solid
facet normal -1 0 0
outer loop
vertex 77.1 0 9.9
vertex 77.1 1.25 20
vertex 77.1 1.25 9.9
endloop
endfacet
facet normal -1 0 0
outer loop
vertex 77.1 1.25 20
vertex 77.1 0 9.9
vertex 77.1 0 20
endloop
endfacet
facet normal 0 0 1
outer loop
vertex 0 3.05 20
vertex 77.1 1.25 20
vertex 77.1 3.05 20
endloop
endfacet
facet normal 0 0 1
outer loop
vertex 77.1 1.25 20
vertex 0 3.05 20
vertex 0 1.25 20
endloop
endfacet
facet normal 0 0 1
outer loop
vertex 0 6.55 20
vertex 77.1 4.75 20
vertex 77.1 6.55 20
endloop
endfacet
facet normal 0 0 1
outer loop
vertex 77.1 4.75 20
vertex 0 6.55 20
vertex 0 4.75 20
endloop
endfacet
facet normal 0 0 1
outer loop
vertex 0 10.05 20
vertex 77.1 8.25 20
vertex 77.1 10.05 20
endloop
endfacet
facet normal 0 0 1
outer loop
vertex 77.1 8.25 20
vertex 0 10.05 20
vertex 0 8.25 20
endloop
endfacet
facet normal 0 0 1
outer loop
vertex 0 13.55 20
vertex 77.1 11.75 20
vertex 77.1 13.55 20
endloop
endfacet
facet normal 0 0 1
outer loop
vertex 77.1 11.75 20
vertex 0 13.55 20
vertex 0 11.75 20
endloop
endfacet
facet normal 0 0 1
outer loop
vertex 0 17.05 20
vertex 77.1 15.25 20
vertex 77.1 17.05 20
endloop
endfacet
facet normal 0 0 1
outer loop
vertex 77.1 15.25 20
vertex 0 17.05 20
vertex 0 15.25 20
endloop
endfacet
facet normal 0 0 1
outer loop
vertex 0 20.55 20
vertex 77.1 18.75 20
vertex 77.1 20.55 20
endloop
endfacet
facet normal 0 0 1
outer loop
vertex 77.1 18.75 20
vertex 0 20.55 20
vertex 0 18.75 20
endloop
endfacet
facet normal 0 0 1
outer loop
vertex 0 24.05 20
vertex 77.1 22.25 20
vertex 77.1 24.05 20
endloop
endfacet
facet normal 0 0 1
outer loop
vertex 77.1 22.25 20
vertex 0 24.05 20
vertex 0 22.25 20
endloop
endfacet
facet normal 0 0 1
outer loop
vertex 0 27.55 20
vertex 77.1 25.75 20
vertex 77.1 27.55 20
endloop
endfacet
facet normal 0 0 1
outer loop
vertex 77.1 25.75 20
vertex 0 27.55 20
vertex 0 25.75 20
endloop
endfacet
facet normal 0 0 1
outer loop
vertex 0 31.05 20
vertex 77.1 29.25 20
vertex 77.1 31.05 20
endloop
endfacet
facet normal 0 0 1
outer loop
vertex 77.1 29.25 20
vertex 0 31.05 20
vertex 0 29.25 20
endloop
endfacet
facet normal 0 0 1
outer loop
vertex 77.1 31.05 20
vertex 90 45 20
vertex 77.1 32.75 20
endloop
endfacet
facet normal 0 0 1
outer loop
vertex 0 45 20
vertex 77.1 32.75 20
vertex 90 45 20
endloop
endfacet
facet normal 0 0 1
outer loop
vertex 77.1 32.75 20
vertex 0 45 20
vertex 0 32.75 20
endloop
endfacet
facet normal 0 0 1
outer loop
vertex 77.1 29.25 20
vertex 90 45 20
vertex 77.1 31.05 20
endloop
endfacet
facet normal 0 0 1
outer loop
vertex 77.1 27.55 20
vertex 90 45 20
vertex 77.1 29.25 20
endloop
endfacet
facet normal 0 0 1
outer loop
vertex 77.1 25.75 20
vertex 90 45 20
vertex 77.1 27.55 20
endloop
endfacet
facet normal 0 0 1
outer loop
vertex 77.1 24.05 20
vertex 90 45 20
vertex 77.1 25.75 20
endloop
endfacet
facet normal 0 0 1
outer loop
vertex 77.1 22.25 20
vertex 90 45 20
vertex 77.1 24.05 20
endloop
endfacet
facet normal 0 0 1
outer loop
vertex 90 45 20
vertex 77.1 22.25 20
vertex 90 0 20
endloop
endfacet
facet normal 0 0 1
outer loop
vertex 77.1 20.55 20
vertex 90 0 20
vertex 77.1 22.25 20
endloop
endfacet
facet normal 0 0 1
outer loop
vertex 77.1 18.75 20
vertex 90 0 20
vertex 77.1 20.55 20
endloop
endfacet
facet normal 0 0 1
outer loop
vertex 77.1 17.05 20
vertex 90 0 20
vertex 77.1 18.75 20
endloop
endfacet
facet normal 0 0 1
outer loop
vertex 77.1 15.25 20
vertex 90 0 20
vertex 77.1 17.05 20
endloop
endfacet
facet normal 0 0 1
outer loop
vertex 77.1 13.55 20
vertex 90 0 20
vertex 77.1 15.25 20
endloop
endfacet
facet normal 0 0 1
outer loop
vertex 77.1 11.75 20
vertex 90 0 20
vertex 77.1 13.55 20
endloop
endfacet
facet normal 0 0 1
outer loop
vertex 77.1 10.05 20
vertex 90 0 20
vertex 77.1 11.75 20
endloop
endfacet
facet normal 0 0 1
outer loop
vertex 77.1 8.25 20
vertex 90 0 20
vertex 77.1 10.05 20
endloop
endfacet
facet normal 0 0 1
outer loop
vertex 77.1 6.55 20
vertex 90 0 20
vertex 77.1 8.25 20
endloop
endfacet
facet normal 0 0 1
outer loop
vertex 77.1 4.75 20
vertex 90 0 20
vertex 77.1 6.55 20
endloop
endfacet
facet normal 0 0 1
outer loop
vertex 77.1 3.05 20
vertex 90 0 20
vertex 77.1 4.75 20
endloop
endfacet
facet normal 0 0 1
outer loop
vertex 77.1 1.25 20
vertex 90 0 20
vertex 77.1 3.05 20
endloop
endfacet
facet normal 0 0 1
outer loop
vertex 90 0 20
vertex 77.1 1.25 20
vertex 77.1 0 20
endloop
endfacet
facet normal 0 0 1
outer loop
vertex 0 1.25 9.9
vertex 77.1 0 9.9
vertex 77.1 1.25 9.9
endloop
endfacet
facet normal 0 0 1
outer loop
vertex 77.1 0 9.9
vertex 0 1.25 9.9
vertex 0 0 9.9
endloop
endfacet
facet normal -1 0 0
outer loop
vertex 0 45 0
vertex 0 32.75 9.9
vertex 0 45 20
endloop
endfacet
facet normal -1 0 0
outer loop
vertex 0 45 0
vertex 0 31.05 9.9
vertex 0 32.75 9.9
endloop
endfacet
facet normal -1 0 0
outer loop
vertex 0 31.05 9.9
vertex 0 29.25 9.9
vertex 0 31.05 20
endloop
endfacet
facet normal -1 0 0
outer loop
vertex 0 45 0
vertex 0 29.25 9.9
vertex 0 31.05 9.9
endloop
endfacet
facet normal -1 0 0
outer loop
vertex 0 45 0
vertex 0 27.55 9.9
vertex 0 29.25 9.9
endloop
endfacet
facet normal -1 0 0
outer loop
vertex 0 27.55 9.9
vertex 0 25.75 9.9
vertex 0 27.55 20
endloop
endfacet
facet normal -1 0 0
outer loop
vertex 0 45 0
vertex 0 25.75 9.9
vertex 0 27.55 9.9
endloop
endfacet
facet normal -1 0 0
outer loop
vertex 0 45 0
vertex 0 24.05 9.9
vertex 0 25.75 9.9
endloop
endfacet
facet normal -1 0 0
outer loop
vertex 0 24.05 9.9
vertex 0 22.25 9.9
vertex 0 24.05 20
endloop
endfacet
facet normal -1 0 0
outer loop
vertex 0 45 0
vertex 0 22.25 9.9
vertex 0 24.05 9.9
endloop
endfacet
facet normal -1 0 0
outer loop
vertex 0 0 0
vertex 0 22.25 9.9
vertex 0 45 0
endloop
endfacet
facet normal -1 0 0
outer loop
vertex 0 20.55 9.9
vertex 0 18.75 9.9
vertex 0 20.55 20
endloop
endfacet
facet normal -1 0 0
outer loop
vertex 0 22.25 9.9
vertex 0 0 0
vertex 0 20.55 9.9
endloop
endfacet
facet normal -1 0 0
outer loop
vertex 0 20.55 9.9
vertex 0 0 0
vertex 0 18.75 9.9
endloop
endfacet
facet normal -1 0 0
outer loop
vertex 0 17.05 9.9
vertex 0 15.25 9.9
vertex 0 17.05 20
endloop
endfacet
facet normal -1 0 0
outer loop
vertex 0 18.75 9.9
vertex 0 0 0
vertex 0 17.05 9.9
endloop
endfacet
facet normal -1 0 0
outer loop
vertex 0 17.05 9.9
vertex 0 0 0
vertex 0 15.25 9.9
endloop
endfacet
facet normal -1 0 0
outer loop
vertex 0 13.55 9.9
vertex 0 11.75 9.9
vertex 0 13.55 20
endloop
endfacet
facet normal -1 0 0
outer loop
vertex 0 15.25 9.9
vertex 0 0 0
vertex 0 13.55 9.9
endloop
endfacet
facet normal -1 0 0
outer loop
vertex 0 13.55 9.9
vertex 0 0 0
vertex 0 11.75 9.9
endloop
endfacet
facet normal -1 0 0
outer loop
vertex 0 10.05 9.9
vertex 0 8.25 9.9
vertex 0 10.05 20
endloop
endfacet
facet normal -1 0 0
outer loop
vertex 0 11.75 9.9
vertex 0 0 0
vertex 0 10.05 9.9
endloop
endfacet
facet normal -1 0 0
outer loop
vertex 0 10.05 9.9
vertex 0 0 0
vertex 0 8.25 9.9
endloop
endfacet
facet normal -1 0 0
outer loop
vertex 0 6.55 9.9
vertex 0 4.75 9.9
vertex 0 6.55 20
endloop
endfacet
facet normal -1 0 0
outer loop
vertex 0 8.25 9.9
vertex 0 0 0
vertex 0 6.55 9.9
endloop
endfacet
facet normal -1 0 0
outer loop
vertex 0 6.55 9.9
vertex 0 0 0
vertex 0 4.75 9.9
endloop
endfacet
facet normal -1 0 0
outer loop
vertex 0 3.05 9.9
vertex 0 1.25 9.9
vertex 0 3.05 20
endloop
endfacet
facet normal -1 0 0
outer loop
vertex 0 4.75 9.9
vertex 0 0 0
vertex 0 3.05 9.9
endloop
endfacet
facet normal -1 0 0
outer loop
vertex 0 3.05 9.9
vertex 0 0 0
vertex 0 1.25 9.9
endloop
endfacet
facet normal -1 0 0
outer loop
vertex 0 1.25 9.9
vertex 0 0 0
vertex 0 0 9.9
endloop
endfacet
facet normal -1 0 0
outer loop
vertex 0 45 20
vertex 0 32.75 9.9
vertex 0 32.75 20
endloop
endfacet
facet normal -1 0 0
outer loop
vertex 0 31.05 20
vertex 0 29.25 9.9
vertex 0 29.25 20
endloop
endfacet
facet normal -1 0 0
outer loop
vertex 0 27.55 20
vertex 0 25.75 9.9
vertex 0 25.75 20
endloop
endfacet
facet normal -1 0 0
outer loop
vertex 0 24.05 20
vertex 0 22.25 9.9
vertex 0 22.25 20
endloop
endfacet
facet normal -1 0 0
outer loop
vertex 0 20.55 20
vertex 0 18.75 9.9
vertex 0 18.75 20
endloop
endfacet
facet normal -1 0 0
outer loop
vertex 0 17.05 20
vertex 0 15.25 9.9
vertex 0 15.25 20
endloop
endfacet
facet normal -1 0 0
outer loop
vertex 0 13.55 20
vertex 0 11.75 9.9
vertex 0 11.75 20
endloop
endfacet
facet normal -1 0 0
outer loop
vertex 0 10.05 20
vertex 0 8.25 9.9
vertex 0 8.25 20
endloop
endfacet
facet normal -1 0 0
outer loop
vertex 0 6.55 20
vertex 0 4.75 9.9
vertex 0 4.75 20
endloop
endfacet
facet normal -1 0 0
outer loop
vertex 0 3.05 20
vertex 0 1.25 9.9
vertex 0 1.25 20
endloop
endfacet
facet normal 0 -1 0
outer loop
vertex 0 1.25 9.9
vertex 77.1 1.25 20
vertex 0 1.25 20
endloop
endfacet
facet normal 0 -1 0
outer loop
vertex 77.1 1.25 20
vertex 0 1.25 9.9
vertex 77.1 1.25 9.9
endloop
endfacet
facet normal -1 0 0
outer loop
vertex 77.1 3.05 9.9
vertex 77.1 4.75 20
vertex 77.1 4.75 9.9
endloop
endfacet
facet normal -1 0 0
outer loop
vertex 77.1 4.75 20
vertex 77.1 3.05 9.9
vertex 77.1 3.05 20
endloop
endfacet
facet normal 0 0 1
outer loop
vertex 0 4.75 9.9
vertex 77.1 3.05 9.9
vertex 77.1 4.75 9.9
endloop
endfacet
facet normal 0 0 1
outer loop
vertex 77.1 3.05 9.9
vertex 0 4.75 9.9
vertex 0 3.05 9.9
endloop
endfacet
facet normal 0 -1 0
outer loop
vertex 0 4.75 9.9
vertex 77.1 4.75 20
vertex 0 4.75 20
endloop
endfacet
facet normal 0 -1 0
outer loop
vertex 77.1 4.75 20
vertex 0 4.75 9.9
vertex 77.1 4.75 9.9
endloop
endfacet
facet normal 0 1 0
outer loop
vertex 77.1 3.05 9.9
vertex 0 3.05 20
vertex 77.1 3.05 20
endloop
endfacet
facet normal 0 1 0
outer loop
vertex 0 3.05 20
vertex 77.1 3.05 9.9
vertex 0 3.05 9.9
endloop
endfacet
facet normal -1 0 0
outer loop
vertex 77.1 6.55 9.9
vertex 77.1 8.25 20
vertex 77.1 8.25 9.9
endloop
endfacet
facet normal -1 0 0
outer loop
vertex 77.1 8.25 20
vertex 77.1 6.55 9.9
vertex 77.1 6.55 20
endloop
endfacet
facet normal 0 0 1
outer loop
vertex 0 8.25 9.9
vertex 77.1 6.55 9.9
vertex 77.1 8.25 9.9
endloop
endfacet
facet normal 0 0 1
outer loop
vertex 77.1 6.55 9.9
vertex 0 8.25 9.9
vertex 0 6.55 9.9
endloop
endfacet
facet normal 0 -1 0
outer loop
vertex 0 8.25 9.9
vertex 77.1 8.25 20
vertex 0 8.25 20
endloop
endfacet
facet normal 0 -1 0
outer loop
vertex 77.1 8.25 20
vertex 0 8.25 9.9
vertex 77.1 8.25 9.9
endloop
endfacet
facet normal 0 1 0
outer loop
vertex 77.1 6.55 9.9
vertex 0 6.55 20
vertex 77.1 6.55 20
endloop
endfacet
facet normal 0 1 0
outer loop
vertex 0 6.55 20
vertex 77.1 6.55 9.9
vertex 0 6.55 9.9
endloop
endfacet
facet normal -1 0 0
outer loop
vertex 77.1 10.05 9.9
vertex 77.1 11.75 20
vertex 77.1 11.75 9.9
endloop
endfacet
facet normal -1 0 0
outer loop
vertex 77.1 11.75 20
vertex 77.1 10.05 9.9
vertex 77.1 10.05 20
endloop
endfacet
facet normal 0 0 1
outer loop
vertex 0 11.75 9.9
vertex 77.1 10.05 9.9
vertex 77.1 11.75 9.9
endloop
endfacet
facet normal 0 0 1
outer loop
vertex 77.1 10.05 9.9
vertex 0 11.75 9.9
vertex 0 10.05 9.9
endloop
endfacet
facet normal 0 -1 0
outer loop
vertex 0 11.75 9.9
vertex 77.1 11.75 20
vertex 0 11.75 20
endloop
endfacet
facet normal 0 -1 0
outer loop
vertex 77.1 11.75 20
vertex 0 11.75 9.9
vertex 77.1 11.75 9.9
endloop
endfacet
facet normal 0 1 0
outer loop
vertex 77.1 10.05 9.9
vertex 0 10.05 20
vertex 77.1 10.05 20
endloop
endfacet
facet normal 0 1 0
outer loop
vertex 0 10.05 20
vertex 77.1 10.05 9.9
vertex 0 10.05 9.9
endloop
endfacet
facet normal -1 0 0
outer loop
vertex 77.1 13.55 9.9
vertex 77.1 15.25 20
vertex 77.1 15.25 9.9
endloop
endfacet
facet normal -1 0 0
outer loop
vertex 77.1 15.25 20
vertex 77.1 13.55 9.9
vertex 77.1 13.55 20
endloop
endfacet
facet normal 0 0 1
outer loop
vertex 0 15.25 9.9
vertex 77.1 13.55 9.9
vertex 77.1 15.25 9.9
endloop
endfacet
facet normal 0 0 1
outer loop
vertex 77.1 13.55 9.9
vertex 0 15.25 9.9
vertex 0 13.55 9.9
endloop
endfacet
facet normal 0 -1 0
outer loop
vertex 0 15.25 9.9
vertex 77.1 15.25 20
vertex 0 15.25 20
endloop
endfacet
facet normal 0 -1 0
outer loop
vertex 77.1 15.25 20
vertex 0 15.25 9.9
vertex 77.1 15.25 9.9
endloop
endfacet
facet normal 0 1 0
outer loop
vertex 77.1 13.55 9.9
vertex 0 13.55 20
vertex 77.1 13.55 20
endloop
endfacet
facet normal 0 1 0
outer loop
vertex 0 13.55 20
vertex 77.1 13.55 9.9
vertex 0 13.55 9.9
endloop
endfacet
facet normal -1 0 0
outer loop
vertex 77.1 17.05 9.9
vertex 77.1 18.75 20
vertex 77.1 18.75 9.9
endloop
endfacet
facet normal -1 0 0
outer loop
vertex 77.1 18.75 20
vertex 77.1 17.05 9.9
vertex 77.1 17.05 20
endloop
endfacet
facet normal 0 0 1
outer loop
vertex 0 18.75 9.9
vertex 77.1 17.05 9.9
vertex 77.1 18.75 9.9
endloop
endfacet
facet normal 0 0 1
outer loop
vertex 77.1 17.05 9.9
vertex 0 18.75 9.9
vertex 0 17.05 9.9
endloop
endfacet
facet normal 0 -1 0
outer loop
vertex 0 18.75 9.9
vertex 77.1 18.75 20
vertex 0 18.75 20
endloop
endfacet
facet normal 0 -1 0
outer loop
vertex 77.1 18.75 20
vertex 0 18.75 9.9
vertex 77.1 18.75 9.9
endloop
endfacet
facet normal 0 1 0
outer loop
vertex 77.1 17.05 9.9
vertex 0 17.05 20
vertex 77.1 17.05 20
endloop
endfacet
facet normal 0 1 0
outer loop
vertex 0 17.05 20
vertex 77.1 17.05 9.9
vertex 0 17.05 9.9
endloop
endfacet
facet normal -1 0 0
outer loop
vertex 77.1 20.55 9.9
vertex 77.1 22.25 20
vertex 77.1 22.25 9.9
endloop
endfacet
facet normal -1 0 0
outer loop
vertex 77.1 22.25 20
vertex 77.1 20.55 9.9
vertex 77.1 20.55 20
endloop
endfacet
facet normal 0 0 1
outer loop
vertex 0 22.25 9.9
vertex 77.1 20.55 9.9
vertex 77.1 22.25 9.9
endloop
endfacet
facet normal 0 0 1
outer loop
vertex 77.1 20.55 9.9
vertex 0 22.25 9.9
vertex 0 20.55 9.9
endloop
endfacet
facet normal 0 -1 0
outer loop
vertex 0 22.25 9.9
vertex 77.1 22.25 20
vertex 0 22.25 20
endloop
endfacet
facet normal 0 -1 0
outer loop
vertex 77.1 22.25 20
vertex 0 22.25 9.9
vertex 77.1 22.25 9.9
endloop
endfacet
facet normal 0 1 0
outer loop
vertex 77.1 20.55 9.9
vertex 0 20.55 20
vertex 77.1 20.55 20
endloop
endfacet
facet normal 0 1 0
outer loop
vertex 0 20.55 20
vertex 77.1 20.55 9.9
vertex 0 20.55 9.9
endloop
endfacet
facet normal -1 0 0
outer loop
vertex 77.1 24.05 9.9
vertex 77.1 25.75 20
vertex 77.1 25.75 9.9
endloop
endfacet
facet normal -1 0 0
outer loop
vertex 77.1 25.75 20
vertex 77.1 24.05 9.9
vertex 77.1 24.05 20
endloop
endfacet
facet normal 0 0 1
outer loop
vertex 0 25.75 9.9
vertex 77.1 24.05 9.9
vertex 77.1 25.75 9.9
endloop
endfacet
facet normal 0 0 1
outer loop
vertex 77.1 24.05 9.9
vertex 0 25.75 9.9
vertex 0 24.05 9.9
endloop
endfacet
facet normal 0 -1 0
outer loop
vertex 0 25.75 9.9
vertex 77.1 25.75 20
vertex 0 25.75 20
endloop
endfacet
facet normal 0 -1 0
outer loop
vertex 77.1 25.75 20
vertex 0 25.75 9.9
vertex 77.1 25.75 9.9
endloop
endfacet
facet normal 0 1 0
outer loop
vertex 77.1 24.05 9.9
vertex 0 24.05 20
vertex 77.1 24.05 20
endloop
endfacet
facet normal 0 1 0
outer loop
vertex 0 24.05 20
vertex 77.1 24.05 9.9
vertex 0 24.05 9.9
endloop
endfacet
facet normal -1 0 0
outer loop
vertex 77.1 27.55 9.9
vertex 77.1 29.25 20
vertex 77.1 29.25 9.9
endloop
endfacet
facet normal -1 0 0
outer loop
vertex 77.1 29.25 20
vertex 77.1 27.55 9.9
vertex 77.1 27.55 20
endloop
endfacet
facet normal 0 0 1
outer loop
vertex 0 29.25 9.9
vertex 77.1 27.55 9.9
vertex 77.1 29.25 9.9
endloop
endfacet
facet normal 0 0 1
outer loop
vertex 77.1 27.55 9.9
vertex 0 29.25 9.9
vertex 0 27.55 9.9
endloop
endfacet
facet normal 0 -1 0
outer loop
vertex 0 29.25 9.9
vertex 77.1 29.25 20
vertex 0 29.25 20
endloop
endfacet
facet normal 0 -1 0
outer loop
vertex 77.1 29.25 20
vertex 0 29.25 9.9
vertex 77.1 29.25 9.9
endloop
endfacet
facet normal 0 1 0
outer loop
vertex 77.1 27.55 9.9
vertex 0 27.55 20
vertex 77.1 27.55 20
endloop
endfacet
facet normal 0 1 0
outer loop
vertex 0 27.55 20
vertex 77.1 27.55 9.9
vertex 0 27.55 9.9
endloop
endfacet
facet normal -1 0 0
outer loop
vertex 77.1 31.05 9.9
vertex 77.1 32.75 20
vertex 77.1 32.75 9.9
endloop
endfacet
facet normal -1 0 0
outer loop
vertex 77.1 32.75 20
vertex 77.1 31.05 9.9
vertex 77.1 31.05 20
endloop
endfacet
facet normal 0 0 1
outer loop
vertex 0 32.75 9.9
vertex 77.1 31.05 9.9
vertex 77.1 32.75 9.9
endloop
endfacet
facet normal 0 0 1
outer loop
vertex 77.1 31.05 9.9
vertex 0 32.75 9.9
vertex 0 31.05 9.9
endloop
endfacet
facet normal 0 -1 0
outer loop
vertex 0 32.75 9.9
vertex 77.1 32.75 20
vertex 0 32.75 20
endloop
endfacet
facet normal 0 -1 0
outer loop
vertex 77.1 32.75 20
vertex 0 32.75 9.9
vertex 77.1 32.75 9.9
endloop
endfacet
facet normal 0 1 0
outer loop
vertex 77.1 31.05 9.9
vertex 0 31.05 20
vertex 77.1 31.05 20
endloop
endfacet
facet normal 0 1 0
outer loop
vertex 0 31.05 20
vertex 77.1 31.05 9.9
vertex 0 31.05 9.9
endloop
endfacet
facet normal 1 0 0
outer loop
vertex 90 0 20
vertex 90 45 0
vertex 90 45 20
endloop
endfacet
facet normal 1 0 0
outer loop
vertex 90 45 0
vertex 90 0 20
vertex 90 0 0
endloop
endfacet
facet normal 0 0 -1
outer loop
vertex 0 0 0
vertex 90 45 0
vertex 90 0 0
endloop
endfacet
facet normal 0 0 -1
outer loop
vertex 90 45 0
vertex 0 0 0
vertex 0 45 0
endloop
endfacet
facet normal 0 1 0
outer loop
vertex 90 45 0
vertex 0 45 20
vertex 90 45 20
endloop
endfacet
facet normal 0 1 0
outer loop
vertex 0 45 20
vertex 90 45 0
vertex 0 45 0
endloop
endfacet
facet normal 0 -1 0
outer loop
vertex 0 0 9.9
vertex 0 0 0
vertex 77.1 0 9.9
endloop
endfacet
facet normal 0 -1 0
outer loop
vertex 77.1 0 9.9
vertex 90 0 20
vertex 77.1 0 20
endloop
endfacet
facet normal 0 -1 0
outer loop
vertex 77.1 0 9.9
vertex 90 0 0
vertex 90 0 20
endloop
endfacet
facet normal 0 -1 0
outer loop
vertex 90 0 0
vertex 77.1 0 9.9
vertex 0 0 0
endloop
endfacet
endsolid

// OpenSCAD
// Drying Rack for 10 Microscope Slides
// Base: 90mm (X) x 45mm (Y) x 20mm (Z)
// Slots: 10 parallel slots along X, 77mm long, 1.6mm wide, 10mm deep
// Spacing: 3.5mm centre-to-centre (Y), centred on block

$fn = 128;

// --- Dimensions ---
// Base dimensions
base_length = 90;   // X
base_width = 45;    // Y
base_height = 20;   // Z

// Slide dimensions (for reference)
slide_length = 75;  // X
slide_width = 25;   // Y
slide_thickness = 1; // Z

// Slot dimensions
slot_length = 77;   // X
slot_width = 1.6;   // Y
slot_depth = 10;    // Z

// Layout
num_slots = 10;
slot_spacing = 3.5; // Centre-to-centre in Y

// --- Calculations ---
// Determine Y position of the first slot centre
// Total width occupied by slots = num_slots * slot_width
// Total width occupied by gaps = (num_slots - 1) * slot_spacing
// Remaining space to distribute on both sides = base_width - (total_slots_width + total_gaps)
// Half of remaining space = margin
total_slot_width = num_slots * slot_width;
total_gap_width = (num_slots - 1) * slot_spacing;
total_occupied_width = total_slot_width + total_gap_width;
margin_y = (base_width - total_occupied_width) / 2;

// First slot Y position
first_slot_y = margin_y + (slot_width / 2);

// --- Build ---

// 1. Create the solid base block
difference() {
    // Main block
    cube([base_length, base_width, base_height], center = false);
    
    // 2. Cut the 10 slots
    // Slots run along X, so we cut a long thin rectangle from the top face downwards
    for (i = [0 : num_slots - 1]) {
        // Calculate Y position for current slot
        current_slot_y = first_slot_y + (i * slot_spacing);
        
        // Define the cutting shape
        // The slot is 77mm long (X), 1.6mm wide (Y), 10mm deep (Z)
        // We extend slightly past the faces to ensure clean cuts (Rule 5)
        cut_length = slot_length + 0.1; 
        cut_width = slot_width + 0.1;
        cut_depth = slot_depth + 0.1;
        
        // Position the cutter
        // X: Centered on the block (0)
        // Y: current_slot_y
        // Z: Top of block is at base_height, we cut down to base_height - slot_depth
        // So the cutter top is at base_height, bottom at base_height - cut_depth
        translate([0, current_slot_y, base_height - cut_depth]) {
            cube([cut_length, cut_width, cut_depth]);
        }
    }
}
